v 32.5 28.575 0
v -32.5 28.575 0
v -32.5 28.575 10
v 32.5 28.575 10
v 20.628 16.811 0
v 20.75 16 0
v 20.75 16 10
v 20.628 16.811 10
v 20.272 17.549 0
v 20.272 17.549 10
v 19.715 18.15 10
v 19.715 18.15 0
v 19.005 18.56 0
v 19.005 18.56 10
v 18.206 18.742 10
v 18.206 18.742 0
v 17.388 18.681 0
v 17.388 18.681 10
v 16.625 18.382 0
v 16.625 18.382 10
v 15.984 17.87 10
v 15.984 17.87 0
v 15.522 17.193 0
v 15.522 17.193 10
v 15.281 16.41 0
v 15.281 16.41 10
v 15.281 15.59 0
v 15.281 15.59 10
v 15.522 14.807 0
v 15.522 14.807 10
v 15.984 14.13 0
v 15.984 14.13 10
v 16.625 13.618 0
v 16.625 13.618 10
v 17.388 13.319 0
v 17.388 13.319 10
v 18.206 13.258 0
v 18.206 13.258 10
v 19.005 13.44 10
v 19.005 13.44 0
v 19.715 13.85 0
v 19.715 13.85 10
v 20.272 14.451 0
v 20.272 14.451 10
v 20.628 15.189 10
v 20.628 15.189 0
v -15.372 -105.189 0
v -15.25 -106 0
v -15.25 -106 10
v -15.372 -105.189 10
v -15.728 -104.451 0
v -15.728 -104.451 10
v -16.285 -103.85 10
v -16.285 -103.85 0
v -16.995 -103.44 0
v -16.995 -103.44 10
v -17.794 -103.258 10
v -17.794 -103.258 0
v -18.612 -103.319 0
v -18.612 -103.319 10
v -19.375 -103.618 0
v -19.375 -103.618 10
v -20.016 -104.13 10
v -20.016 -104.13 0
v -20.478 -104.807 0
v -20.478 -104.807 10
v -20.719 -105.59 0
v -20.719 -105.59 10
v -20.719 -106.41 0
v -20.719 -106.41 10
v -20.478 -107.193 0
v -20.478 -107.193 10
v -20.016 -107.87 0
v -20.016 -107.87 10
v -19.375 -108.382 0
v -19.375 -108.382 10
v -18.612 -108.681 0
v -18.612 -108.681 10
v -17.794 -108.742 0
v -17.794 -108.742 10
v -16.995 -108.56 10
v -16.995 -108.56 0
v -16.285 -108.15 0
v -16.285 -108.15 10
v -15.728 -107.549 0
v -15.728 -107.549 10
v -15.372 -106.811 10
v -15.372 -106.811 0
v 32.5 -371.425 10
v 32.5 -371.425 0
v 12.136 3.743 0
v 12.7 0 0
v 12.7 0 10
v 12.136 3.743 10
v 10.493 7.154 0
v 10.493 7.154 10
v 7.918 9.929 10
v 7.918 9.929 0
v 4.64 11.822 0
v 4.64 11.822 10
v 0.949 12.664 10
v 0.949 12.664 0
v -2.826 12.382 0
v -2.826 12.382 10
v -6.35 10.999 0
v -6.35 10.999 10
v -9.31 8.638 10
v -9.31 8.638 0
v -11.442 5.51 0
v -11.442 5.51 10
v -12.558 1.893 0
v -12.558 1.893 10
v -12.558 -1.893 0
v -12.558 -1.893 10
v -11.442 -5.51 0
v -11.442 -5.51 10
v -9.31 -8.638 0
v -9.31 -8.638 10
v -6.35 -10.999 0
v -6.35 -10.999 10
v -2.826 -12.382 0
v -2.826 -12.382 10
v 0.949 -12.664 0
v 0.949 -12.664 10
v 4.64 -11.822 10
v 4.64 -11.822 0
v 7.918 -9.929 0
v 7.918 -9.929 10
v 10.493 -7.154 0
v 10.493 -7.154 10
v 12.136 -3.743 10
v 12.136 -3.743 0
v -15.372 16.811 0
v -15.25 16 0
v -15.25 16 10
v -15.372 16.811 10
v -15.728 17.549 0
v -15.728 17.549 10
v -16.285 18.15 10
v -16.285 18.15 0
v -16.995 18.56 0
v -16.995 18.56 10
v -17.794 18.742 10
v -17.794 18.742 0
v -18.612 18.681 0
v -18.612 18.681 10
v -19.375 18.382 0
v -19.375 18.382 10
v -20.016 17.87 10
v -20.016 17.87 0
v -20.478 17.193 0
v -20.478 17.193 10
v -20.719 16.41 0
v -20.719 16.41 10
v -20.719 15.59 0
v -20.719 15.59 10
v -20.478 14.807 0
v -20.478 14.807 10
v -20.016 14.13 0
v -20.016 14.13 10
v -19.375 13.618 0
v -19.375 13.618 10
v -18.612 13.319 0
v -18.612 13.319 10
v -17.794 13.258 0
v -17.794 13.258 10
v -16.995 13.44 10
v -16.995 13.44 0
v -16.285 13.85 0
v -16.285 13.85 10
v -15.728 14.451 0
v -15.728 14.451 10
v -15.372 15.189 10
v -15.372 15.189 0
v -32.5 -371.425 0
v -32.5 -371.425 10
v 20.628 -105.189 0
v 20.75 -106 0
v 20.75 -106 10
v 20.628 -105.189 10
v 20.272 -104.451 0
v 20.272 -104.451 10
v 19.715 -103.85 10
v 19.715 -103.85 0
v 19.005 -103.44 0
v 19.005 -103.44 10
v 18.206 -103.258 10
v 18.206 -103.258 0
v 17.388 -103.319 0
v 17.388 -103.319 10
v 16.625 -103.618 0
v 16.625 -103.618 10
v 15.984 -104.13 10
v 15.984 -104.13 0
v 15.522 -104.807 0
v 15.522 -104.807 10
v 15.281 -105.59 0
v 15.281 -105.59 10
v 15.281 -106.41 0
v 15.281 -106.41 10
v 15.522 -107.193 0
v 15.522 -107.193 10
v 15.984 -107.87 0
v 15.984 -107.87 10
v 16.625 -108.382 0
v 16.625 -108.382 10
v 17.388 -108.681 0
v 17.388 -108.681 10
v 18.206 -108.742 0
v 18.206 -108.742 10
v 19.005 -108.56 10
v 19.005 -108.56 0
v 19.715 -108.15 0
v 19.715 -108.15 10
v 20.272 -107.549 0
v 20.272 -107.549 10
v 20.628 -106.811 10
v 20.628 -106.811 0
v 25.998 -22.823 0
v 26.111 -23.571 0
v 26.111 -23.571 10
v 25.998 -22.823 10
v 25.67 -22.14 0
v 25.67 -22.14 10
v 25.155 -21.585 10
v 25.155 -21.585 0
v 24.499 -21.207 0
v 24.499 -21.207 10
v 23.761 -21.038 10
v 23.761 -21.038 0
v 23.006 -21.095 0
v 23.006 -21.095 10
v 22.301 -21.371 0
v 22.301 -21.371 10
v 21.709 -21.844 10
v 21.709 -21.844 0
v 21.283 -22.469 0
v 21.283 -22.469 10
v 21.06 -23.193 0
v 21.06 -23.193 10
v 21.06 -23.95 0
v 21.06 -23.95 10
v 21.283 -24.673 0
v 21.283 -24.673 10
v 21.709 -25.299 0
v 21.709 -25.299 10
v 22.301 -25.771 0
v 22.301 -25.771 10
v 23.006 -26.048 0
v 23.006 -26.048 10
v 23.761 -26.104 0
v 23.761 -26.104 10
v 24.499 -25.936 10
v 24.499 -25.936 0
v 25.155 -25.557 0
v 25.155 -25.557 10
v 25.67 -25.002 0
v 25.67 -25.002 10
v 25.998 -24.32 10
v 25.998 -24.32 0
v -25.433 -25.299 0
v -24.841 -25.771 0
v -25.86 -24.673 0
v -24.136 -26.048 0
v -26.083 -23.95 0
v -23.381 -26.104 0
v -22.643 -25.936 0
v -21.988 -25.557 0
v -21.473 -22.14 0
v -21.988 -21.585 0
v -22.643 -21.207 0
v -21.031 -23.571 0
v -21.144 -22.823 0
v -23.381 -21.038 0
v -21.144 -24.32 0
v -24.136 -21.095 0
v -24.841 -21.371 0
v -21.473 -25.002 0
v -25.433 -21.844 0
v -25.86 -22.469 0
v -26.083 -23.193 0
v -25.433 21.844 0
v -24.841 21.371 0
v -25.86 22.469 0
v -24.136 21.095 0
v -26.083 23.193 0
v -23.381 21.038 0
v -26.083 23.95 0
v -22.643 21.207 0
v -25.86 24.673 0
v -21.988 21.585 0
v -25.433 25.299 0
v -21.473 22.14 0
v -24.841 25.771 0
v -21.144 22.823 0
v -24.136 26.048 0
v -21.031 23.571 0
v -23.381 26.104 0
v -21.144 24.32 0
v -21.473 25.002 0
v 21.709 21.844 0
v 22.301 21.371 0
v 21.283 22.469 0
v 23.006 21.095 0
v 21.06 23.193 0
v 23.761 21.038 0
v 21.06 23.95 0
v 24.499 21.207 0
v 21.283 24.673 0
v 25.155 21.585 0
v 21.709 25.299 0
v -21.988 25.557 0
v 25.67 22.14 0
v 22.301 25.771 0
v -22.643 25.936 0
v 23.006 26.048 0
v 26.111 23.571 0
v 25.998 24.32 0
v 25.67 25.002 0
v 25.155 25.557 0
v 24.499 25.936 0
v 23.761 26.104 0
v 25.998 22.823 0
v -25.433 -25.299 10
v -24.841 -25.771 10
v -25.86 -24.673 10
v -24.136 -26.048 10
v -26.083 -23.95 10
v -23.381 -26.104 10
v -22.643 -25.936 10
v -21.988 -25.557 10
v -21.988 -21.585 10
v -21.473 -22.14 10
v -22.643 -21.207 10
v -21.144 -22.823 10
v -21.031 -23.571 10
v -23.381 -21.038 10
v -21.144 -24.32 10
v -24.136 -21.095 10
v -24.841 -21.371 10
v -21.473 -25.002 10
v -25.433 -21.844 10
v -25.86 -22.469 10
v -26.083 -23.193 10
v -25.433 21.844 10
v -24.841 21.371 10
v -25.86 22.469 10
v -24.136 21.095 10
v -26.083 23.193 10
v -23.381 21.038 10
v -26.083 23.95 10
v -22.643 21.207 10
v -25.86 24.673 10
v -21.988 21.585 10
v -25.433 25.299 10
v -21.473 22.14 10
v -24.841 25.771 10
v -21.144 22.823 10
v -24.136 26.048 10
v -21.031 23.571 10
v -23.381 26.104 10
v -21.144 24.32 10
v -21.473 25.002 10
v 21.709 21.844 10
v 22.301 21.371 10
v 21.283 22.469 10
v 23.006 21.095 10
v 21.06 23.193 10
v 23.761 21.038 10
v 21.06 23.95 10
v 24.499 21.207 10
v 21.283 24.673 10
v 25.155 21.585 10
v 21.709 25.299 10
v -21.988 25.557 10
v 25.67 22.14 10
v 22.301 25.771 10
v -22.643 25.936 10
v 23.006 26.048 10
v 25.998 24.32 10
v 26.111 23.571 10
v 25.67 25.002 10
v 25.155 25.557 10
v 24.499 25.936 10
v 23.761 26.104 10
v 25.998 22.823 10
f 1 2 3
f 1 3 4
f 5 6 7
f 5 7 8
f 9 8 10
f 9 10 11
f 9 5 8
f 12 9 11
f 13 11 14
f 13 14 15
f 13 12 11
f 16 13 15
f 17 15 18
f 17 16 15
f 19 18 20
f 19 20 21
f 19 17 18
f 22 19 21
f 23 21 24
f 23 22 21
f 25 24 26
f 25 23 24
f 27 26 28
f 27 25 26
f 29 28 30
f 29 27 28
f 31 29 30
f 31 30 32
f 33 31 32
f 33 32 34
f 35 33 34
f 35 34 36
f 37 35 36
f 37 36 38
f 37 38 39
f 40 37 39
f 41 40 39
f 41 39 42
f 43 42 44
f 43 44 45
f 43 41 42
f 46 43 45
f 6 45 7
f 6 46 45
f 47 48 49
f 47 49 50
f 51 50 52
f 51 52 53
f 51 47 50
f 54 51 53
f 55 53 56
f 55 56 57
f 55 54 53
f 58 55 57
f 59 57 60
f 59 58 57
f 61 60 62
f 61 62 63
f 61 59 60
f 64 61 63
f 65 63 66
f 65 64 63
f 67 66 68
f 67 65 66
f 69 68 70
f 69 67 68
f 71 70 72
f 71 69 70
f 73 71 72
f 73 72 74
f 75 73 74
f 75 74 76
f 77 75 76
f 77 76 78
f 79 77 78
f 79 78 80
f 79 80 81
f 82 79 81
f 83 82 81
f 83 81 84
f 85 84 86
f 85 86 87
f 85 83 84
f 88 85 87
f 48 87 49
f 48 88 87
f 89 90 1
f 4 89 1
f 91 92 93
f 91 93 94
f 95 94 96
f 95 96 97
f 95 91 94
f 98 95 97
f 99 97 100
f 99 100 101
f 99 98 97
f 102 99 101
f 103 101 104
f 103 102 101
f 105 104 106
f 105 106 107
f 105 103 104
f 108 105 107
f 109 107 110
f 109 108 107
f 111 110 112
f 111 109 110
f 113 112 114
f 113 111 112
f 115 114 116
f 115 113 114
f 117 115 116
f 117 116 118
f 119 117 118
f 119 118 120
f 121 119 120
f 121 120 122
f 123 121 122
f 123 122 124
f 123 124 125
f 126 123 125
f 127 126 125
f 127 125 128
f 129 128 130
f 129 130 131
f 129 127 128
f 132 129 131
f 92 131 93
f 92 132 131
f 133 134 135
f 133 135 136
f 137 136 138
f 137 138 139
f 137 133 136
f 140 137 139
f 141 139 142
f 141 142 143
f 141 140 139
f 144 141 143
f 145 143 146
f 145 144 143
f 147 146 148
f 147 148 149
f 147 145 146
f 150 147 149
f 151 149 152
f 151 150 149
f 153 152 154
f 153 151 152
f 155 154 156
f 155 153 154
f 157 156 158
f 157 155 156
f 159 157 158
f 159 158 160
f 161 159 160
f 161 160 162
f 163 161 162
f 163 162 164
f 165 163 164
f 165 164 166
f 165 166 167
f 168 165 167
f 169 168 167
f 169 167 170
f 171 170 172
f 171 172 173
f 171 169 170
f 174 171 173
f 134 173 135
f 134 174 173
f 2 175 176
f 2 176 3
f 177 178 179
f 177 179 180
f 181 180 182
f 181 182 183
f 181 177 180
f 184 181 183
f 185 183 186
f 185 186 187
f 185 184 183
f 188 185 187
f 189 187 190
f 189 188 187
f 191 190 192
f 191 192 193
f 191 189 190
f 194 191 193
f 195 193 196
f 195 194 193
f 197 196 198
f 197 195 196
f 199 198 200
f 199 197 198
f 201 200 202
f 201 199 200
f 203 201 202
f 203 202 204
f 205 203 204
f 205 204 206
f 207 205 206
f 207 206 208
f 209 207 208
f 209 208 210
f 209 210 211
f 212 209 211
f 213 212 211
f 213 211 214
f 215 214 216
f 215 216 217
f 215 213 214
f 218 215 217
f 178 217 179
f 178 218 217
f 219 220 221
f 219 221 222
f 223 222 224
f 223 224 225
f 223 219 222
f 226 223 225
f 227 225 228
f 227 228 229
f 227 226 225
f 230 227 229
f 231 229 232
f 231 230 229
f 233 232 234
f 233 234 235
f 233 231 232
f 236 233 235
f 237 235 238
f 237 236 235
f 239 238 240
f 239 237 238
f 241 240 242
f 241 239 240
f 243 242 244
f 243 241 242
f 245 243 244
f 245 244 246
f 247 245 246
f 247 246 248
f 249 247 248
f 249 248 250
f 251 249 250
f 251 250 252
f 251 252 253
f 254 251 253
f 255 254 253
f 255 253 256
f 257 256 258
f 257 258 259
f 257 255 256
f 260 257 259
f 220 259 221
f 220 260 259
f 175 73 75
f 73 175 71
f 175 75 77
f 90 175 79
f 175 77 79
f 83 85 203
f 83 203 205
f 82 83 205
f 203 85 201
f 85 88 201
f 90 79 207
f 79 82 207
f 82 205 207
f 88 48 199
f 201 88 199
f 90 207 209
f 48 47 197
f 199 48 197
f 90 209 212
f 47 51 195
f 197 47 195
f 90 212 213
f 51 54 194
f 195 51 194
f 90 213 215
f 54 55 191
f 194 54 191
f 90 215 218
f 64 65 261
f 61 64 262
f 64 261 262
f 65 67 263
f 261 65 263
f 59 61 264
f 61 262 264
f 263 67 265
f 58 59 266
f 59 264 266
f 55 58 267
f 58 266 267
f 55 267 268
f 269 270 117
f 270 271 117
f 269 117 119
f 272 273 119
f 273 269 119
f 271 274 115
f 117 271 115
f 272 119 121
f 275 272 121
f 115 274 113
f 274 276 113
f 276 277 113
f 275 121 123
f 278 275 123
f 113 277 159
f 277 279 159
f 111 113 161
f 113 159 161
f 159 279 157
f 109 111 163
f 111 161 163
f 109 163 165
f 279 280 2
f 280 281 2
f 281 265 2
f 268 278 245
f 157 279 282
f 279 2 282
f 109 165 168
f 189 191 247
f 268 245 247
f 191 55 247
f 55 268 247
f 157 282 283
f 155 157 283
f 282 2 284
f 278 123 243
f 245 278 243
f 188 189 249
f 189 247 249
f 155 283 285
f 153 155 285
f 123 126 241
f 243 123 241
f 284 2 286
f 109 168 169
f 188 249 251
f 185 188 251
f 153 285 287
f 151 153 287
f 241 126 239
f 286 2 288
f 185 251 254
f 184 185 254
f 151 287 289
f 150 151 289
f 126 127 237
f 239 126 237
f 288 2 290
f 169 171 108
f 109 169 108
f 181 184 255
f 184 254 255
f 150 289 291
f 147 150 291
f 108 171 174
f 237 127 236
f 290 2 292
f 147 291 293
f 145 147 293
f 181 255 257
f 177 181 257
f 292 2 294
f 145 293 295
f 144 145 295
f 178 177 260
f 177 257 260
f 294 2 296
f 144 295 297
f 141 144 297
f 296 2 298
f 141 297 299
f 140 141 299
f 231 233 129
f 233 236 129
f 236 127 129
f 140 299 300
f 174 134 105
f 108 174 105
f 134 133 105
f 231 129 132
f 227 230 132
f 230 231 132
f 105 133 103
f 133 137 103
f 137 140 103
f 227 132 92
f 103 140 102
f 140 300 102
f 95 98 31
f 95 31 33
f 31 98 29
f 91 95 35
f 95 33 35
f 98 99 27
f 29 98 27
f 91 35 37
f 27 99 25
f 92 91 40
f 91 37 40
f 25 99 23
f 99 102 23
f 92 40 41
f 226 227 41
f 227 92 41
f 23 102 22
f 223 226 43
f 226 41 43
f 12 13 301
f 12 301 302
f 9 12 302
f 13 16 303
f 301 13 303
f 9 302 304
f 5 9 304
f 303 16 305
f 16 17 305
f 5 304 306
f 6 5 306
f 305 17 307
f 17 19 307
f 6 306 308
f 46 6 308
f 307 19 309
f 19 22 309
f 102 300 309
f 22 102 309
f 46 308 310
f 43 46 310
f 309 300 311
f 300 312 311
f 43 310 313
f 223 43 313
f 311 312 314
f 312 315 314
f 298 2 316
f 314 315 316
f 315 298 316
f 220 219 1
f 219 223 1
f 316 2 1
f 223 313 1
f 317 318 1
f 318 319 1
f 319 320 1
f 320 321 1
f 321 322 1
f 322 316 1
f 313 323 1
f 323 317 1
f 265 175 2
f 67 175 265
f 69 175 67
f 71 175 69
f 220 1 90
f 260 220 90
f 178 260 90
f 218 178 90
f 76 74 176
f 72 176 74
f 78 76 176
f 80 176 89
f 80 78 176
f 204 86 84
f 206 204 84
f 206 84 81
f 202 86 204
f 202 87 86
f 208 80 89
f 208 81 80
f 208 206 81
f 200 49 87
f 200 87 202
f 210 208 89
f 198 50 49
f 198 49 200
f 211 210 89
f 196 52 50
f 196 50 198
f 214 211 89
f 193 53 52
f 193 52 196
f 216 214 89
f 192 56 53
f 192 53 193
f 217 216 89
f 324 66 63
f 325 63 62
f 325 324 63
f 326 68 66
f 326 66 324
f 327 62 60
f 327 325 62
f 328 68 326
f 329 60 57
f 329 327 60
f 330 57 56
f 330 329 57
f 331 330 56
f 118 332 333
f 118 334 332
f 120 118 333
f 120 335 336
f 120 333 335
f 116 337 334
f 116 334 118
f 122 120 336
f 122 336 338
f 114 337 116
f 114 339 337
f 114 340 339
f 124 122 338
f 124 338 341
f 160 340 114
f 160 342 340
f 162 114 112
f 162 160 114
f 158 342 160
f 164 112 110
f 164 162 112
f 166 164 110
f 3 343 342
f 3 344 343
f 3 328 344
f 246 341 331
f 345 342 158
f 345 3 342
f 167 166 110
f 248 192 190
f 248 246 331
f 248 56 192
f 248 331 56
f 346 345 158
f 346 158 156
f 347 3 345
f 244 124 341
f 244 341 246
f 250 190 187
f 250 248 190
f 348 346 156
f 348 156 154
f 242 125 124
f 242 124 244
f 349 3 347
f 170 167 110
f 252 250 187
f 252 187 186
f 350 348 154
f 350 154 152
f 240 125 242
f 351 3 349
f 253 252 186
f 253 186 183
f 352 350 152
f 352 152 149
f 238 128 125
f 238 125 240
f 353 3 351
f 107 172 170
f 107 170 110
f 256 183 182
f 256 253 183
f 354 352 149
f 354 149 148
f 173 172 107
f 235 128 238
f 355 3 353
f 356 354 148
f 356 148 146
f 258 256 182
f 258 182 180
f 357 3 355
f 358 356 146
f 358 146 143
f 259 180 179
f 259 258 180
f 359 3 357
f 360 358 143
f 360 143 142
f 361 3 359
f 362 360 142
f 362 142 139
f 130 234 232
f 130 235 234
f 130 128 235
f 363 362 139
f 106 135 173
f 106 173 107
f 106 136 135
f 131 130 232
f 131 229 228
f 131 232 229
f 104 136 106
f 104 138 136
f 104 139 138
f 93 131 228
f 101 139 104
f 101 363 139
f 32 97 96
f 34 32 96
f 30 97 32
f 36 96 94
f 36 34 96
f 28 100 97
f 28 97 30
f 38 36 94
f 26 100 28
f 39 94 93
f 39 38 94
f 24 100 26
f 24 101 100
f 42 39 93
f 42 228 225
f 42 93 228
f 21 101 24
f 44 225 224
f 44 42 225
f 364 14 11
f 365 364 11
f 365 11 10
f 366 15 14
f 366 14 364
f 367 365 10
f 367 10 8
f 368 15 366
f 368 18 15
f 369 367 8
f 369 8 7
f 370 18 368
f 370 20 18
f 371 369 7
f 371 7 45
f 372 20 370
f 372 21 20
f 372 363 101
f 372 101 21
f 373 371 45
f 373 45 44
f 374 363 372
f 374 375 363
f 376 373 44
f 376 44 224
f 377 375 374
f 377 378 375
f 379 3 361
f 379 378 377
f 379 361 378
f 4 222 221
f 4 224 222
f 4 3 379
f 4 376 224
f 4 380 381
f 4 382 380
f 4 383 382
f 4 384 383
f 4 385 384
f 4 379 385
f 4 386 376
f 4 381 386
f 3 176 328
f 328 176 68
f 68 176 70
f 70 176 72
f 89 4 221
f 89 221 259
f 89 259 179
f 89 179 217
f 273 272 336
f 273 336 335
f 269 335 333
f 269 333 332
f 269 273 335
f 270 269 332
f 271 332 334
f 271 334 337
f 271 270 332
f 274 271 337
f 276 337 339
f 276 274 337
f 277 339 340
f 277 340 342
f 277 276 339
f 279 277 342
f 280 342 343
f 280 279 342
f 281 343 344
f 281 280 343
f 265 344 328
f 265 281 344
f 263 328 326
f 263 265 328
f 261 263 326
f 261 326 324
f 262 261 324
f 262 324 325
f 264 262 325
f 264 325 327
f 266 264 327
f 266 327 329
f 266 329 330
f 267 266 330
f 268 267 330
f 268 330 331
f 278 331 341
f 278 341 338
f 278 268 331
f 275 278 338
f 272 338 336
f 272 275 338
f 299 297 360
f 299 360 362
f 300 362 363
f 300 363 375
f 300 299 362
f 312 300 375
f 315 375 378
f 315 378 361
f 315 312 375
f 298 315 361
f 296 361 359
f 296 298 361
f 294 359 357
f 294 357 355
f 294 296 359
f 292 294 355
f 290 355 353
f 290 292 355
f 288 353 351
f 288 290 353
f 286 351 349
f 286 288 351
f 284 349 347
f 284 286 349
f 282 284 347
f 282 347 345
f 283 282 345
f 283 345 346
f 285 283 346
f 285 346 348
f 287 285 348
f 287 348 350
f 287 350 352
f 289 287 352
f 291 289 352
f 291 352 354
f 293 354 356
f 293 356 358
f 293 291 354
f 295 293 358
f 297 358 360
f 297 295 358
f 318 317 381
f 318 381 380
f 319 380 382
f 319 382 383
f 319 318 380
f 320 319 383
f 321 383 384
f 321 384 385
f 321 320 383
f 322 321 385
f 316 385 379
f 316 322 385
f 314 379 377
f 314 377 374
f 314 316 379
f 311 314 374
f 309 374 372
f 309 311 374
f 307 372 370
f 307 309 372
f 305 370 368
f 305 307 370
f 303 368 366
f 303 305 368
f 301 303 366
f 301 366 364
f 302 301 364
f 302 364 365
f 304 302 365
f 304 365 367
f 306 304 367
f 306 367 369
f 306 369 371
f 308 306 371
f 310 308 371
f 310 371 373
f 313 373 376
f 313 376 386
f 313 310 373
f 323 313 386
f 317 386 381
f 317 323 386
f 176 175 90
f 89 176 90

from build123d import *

# Parameters (mm, degrees)
SKETCH1_W           = 65
SKETCH1_H           = 400
SKETCH1_R           = 2.54
SKETCH1_R_2         = 12.7
SKETCH1_R_3         = 2.75
BOSS_EXTRUDE1_DEPTH = 10


with BuildPart() as part:
    # Sketch1 → Boss-Extrude1 (new body)
    with BuildSketch(Plane.XY):
        with Locations((0, -171.425)):
            Rectangle(SKETCH1_W, SKETCH1_H)
        with Locations((-23.5712, 23.5712)):
            Circle(SKETCH1_R, mode=Mode.SUBTRACT)
        with Locations((23.5712, 23.5712)):
            Circle(SKETCH1_R, mode=Mode.SUBTRACT)
        with Locations((23.5712, -23.5712)):
            Circle(SKETCH1_R, mode=Mode.SUBTRACT)
        with Locations((-23.5712, -23.5712)):
            Circle(SKETCH1_R, mode=Mode.SUBTRACT)
        Circle(SKETCH1_R_2, mode=Mode.SUBTRACT)
        with Locations((18, 16)):
            Circle(SKETCH1_R_3, mode=Mode.SUBTRACT)
        with Locations((-18, 16)):
            Circle(SKETCH1_R_3, mode=Mode.SUBTRACT)
        with Locations((18, -106)):
            Circle(SKETCH1_R_3, mode=Mode.SUBTRACT)
        with Locations((-18, -106)):
            Circle(SKETCH1_R_3, mode=Mode.SUBTRACT)
    extrude(amount=BOSS_EXTRUDE1_DEPTH)


solid = part.part
